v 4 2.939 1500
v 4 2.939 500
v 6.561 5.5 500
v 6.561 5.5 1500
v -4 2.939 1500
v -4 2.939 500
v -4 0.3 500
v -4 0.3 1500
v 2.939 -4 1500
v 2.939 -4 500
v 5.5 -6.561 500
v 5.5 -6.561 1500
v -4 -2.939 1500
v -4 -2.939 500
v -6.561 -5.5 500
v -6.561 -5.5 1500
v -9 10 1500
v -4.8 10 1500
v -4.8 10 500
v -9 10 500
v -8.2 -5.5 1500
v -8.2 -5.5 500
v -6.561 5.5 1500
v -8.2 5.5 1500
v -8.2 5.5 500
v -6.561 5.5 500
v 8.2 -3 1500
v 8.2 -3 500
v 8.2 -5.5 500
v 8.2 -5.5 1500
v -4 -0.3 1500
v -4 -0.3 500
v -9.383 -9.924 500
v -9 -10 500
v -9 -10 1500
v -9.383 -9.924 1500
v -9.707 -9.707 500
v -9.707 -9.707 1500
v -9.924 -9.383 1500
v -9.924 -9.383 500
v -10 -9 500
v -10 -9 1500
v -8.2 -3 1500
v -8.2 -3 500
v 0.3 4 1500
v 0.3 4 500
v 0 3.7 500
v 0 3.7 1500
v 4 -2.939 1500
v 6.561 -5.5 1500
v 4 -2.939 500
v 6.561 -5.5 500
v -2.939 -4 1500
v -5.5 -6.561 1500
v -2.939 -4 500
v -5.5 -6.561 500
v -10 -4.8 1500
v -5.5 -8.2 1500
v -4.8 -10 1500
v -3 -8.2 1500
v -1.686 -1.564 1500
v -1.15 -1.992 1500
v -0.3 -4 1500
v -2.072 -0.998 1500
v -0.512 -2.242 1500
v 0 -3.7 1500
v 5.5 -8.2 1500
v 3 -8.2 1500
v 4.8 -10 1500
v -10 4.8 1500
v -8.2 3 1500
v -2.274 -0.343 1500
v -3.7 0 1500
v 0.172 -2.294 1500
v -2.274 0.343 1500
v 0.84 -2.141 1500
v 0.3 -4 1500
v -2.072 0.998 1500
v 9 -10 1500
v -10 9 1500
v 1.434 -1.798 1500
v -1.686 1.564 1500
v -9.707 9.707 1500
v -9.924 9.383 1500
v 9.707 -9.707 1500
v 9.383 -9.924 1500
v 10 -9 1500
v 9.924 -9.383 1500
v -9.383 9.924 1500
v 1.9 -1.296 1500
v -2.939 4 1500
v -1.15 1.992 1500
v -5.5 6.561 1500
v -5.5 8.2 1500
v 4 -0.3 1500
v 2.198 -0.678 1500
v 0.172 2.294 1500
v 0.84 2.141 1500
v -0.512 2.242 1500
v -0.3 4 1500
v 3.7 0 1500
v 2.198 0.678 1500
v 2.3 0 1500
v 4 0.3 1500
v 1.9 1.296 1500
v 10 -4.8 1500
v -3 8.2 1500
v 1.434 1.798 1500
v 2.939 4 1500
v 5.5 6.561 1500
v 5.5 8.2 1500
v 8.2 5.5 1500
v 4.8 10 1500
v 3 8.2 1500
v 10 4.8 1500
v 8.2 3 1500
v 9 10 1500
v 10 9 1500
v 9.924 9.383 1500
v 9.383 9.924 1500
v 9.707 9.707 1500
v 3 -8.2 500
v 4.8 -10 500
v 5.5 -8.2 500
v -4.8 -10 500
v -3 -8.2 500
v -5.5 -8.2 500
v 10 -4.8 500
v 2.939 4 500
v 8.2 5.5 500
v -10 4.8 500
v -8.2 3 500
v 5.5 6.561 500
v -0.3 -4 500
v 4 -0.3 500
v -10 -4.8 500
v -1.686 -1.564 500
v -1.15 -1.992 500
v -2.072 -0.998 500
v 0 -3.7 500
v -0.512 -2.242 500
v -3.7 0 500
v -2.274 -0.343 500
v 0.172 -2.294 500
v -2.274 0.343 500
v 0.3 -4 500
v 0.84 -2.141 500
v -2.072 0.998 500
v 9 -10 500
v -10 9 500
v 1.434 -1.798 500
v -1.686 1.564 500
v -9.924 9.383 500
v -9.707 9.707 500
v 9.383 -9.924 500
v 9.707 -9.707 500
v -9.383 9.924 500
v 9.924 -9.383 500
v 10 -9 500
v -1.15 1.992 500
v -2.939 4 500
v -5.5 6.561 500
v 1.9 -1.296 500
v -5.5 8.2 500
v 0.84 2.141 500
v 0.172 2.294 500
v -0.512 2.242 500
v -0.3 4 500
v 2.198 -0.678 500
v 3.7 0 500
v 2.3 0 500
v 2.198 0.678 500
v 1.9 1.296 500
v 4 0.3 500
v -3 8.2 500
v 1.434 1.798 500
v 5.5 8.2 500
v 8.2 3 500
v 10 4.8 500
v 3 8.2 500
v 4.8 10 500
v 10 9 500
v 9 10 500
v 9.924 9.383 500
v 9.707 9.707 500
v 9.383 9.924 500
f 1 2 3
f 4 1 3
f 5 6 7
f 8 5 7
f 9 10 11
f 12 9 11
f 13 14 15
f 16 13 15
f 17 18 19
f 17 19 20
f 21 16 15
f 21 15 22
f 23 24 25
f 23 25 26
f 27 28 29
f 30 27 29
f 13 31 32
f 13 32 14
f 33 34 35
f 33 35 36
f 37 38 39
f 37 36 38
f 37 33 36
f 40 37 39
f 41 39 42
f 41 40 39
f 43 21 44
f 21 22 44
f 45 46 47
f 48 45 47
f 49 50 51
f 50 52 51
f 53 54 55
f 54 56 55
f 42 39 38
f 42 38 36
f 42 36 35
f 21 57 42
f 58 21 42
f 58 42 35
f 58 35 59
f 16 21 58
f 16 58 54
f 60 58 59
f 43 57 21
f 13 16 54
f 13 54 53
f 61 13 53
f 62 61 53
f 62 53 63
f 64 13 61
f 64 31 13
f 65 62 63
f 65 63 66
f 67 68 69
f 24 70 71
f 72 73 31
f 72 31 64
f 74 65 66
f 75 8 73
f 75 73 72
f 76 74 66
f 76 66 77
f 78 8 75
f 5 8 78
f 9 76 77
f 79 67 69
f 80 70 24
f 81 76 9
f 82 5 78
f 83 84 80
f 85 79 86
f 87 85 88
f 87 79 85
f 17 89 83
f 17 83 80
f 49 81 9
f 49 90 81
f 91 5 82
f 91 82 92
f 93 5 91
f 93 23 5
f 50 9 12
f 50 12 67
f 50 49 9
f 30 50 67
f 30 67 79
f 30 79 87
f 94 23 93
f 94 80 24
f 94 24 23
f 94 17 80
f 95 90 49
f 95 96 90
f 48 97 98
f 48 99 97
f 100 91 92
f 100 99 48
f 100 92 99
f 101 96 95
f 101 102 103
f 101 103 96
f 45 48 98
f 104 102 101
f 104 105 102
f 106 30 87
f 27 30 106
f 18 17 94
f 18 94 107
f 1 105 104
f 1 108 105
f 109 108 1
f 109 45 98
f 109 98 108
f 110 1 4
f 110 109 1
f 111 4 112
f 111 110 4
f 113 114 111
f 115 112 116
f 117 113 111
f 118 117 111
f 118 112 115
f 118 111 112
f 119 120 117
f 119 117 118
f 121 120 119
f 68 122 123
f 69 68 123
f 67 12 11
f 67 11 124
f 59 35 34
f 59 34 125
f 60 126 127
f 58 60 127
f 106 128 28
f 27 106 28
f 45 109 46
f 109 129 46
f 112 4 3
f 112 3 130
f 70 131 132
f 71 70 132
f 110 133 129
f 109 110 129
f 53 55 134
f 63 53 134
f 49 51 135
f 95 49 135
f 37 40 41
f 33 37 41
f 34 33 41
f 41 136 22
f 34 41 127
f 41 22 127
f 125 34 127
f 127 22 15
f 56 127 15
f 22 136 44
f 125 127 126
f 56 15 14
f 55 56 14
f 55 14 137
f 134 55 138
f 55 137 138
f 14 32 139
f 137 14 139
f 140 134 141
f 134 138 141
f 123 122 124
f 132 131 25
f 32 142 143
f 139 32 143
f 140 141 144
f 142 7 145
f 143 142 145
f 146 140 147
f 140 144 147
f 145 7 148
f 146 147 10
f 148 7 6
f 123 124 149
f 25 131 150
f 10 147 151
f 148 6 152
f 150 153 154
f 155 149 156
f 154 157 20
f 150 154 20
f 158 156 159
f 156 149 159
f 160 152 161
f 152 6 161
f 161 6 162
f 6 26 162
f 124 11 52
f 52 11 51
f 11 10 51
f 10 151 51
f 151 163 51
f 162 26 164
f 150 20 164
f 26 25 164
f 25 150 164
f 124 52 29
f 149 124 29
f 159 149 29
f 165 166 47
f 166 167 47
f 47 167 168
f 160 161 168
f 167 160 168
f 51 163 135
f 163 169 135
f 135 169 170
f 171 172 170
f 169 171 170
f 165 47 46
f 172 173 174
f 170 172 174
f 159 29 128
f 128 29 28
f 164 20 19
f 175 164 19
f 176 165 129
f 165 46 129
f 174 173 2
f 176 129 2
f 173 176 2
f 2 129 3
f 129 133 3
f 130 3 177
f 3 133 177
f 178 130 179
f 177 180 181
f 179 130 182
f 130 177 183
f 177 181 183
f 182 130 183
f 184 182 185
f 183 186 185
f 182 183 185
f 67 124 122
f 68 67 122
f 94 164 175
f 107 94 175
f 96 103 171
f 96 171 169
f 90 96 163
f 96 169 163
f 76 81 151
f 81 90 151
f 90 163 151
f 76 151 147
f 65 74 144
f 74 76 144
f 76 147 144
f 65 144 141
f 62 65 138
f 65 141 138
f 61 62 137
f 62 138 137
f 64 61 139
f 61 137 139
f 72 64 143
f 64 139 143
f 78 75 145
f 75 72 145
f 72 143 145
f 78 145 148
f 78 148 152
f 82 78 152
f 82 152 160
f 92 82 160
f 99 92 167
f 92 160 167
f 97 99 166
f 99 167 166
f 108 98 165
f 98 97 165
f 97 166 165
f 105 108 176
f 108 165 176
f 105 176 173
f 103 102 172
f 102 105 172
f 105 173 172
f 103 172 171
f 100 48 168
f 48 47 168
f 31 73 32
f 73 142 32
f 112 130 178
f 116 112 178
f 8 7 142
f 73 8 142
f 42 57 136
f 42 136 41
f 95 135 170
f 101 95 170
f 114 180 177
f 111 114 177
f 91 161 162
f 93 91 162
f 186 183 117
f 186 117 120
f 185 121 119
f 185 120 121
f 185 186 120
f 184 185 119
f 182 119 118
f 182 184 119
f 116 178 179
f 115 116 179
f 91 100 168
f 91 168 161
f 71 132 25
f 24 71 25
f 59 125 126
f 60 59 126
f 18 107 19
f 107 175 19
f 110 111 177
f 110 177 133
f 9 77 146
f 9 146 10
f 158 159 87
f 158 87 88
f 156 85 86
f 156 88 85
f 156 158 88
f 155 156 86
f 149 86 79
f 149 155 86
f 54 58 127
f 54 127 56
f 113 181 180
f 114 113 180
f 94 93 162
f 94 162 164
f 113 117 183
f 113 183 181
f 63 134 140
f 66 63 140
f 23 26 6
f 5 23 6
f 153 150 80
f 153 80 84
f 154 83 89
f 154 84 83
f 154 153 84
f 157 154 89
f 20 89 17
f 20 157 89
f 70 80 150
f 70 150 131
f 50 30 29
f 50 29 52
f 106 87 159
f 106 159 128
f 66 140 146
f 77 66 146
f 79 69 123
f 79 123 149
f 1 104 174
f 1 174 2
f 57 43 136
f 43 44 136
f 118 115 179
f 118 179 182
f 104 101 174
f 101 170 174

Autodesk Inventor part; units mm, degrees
ref_plane "YZ Plane" through (0, 0, 0) normal (1, 0, 0) x (0, 1, 0)
ref_plane "Plano1" through (0, 0, -500) normal (0, 0, 1) x (1, 0, 0)
ref_plane "Plano de trabalho2" through (-9, -10, 500) normal (0, 0, 1) x (1, 0, 0)
sketch "Esboço1" plane through (-9, -10, 500) normal (0, 0, 1) x (1, 0, 0)
  arc A0 (-1, 1) -> (0, 0) centre (0, 1) ccw projected
  line L0 (0, 0) -> (4.2, 0) projected
  line L1 (4.2, 0) -> (6, 1.8) projected
  line L2 (6, 1.8) -> (3.5, 1.8) projected
  line L3 (3.5, 1.8) -> (3.5, 3.4393) projected
  line L4 (3.5, 3.4393) -> (6.0607, 6) projected
  line L5 (6.0607, 6) -> (8.7, 6) projected
  line L6 (8.7, 6) -> (9, 6.3) projected
  line L7 (9, 6.3) -> (9.3, 6) projected
  line L8 (9.3, 6) -> (11.9393, 6) projected
  line L9 (11.9393, 6) -> (14.5, 3.4393) projected
  line L10 (14.5, 3.4393) -> (14.5, 1.8) projected
  line L11 (14.5, 1.8) -> (12, 1.8) projected
  line L12 (12, 1.8) -> (13.8, 0) projected
  line L13 (13.8, 0) -> (18, 0) projected
  arc A1 (18, 0) -> (19, 1) centre (18, 1) ccw projected
  line L14 (19, 1) -> (19, 5.2) projected
  line L15 (19, 5.2) -> (17.2, 7) projected
  line L16 (17.2, 7) -> (17.2, 4.5) projected
  line L17 (17.2, 4.5) -> (15.5607, 4.5) projected
  line L18 (15.5607, 4.5) -> (13, 7.0607) projected
  line L19 (13, 7.0607) -> (13, 9.7) projected
  line L20 (13, 9.7) -> (12.7, 10) projected
  line L21 (12.7, 10) -> (13, 10.3) projected
  line L22 (13, 10.3) -> (13, 12.9393) projected
  line L23 (13, 12.9393) -> (15.5607, 15.5) projected
  line L24 (15.5607, 15.5) -> (17.2, 15.5) projected
  line L25 (17.2, 15.5) -> (17.2, 13) projected
  line L26 (17.2, 13) -> (19, 14.8) projected
  line L27 (19, 14.8) -> (19, 19) projected
  arc A2 (19, 19) -> (18, 20) centre (18, 19) ccw projected
  line L28 (18, 20) -> (13.8, 20) projected
  line L29 (13.8, 20) -> (12, 18.2) projected
  line L30 (12, 18.2) -> (14.5, 18.2) projected
  line L31 (14.5, 18.2) -> (14.5, 16.5607) projected
  line L32 (14.5, 16.5607) -> (11.9393, 14) projected
  line L33 (11.9393, 14) -> (9.3, 14) projected
  line L34 (9.3, 14) -> (9, 13.7) projected
  line L35 (9, 13.7) -> (8.7, 14) projected
  line L36 (8.7, 14) -> (6.0607, 14) projected
  line L37 (6.0607, 14) -> (3.5, 16.5607) projected
  line L38 (3.5, 16.5607) -> (3.5, 18.2) projected
  line L39 (3.5, 18.2) -> (6, 18.2) projected
  line L40 (6, 18.2) -> (4.2, 20) projected
  line L41 (4.2, 20) -> (0, 20) projected
  arc A3 (0, 20) -> (-1, 19) centre (0, 19) ccw projected
  line L42 (-1, 19) -> (-1, 14.8) projected
  line L43 (-1, 14.8) -> (0.8, 13) projected
  line L44 (0.8, 13) -> (0.8, 15.5) projected
  line L45 (0.8, 15.5) -> (2.4393, 15.5) projected
  line L46 (2.4393, 15.5) -> (5, 12.9393) projected
  line L47 (5, 12.9393) -> (5, 10.3) projected
  line L48 (5, 10.3) -> (5.3, 10) projected
  line L49 (5.3, 10) -> (5, 9.7) projected
  line L50 (5, 9.7) -> (5, 7.0607) projected
  line L51 (5, 7.0607) -> (2.4393, 4.5) projected
  line L52 (2.4393, 4.5) -> (0.8, 4.5) projected
  line L53 (0.8, 4.5) -> (0.8, 7) projected
  line L54 (0.8, 7) -> (-1, 5.2) projected
  line L55 (-1, 5.2) -> (-1, 1) projected
  circle A4 centre (9, 10) radius 2.3 projected
extrude "Extrusão1" add sketch "Esboço1" along normal blind 1000
properties part number "PERFIL 2020 V-SLOT" material "6063-T5"
